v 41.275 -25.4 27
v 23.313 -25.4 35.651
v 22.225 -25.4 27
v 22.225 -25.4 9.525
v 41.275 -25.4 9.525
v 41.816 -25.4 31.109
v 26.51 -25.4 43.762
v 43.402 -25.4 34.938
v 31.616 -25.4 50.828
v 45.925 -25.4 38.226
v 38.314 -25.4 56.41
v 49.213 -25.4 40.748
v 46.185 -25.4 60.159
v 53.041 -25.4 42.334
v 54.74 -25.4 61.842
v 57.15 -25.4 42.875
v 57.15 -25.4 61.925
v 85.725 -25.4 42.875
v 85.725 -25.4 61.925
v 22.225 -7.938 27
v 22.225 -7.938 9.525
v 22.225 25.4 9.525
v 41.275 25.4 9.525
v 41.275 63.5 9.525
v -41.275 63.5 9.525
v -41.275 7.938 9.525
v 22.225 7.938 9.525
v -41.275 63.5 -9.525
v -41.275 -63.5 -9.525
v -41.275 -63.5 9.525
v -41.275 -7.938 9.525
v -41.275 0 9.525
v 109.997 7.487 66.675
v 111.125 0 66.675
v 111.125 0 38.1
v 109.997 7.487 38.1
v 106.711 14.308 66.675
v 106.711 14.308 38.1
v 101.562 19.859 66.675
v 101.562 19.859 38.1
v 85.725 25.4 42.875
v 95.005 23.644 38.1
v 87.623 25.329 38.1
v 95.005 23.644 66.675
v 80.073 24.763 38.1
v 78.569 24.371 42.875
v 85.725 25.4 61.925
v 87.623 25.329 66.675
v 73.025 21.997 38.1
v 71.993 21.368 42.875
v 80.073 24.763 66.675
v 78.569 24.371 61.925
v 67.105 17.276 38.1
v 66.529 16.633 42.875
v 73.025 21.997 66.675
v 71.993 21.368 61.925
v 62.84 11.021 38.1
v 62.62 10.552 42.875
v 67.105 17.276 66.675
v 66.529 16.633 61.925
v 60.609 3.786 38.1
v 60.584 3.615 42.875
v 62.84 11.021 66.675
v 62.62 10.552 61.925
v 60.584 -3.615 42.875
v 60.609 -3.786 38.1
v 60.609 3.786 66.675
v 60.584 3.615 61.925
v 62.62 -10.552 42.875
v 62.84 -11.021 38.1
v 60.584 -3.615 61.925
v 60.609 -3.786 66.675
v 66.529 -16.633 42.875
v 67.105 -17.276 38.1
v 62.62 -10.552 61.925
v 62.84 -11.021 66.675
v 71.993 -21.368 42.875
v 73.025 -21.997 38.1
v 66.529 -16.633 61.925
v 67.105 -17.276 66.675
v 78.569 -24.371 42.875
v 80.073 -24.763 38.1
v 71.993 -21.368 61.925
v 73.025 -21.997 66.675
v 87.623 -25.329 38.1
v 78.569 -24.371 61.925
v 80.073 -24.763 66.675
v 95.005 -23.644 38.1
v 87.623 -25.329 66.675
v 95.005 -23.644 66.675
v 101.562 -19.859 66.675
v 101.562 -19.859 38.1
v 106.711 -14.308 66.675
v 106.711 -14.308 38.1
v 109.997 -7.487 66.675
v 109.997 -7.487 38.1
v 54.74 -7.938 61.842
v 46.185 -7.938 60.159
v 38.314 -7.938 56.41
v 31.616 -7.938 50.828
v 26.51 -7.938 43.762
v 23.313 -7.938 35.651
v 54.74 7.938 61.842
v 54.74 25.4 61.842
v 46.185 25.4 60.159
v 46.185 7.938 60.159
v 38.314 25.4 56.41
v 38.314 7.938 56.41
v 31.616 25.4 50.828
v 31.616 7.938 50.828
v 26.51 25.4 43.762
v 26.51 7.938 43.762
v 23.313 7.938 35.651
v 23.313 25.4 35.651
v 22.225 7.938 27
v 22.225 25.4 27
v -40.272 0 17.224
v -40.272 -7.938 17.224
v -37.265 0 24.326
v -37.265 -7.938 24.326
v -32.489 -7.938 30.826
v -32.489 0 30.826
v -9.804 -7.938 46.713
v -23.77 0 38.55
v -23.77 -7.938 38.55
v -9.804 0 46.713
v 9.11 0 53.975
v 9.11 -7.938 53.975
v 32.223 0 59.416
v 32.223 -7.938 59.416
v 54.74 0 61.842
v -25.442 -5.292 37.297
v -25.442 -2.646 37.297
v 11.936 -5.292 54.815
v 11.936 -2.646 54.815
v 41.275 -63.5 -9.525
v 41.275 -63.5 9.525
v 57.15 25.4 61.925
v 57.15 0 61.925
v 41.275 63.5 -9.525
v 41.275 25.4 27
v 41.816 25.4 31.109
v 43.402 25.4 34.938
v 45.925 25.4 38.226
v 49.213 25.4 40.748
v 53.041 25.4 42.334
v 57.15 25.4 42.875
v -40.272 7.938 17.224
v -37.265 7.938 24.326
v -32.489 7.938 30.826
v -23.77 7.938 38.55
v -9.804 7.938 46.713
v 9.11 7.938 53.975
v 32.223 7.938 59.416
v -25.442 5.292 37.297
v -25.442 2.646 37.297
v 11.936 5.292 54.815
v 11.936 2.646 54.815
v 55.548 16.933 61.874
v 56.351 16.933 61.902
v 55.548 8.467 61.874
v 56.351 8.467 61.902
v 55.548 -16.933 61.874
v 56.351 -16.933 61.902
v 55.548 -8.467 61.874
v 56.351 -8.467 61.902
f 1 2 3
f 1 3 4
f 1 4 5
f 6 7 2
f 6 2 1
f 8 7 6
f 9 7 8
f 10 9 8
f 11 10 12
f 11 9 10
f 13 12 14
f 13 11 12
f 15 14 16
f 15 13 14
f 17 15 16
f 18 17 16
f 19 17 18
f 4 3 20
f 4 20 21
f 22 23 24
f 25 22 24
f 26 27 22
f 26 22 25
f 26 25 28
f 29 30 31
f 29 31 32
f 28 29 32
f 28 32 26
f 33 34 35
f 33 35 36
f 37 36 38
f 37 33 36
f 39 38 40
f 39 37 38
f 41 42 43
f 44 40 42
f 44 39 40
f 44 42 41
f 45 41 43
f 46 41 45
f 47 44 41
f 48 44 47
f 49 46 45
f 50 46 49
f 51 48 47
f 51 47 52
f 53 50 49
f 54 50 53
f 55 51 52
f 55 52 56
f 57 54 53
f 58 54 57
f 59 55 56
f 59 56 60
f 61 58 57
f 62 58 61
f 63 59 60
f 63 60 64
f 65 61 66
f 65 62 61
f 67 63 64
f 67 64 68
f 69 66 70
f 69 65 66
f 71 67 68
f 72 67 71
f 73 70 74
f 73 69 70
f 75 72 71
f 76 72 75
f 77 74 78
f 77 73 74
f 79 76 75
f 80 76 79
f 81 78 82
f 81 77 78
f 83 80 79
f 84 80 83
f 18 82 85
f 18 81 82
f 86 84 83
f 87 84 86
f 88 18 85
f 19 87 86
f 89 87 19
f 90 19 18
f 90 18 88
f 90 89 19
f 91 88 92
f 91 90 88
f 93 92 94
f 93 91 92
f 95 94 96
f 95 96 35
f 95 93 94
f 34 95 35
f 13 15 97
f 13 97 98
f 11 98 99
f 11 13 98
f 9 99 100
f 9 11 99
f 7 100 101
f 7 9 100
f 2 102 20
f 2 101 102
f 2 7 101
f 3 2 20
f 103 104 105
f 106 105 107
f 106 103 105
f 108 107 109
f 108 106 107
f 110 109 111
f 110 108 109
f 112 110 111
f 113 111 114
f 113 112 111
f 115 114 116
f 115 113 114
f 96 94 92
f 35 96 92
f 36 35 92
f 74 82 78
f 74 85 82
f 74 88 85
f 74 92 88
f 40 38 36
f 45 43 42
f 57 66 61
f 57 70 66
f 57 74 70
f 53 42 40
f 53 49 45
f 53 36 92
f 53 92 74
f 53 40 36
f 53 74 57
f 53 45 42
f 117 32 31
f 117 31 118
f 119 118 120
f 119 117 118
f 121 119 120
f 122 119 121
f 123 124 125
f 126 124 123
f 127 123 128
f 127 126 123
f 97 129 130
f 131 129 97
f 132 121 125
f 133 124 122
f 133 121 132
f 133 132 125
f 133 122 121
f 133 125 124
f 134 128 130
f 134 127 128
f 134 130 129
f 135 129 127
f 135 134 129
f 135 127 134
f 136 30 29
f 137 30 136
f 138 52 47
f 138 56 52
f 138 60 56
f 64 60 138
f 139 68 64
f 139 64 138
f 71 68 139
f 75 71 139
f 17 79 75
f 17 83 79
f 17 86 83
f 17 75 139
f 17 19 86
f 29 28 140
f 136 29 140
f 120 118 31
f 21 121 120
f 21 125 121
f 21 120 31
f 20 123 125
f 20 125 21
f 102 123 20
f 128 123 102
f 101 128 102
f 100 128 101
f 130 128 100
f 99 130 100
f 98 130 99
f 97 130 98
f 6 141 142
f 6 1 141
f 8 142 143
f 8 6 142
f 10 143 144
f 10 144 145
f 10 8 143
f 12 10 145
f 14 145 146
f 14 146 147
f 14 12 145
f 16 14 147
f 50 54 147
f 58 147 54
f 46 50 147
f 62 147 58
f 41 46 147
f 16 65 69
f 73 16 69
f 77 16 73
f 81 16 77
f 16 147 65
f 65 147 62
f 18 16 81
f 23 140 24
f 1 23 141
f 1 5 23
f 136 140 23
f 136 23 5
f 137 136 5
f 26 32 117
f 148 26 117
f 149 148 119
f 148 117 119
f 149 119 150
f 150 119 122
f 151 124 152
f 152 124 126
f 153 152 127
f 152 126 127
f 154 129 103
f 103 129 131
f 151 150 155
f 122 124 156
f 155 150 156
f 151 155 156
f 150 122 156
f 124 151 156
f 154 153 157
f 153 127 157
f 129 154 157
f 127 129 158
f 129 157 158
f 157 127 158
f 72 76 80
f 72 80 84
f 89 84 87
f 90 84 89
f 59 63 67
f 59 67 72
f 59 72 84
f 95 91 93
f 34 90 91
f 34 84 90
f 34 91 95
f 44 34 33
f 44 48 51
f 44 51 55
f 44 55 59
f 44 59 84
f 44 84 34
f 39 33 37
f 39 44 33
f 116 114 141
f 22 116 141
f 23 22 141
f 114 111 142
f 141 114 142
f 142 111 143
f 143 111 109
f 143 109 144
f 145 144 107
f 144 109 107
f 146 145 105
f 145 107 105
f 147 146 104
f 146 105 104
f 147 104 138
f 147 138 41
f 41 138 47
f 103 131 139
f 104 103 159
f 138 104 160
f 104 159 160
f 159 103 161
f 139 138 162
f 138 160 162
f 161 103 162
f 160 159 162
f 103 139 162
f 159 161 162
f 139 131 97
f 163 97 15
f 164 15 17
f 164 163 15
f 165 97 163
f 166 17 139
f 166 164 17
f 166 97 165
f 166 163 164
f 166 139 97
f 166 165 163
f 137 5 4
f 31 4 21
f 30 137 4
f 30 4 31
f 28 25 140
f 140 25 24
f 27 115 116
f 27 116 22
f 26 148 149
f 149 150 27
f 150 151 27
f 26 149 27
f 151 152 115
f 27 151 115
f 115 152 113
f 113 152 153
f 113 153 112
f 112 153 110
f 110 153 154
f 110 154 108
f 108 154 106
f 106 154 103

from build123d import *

# Parameters (mm, degrees)
F1_DEPTH = 63.5
F0_W     = 25.4
F0_H     = 19.05
F2_DEPTH = 25.4
F3_DEPTH = 7.9375


with BuildPart() as f1:
    # F0 (on Front) → F1 (new body, symmetric)
    with BuildSketch(Plane.XZ):
        Polygon((41.275, -9.525), (41.275, 9.525), (22.225, 9.525), (-41.275, 9.525), (-41.275, -9.525), align=None)
    extrude(amount=F1_DEPTH, both=True)

    # F0 (on Front) → F2 (join, symmetric)
    with BuildSketch(Plane.XZ):
        with Locations((73.025, 52.4002)):
            Rectangle(F0_W, F0_H)
        with BuildLine():
            Line((22.225, 9.525), (41.275, 9.525))
            Line((41.275, 9.525), (41.275, 27.0002))
            ThreePointArc((41.275, 27.0002), (45.9246798487, 38.2255201513), (57.15, 42.8752))
            Line((57.15, 42.8752), (60.325, 42.8752))
            Line((60.325, 42.8752), (60.325, 61.9252))
            Line((60.325, 61.9252), (57.15, 61.9252))
            add(Edge.make_bspline(
                [(54.7396282089, 61.841924022), (55.5498180251, 61.8762426879), (56.3534740618, 61.9040043012), (57.15, 61.9252)],
                knots=[109.298641458, 109.298641458, 109.298641458, 109.298641458, 111.5045361635, 111.5045361635, 111.5045361635, 111.5045361635], degree=3))
            ThreePointArc((54.7396282089, 61.841924022), (31.6163177371, 50.828475118), (22.225, 27.0002))
            Line((22.225, 27.0002), (22.225, 9.525))
        make_face()
    extrude(amount=F2_DEPTH, both=True)

    # F0 (on Front) → F3 (join, symmetric)
    with BuildSketch(Plane.XZ):
        with BuildLine():
            Line((-41.275, 9.525), (22.225, 9.525))
            Line((22.225, 9.525), (22.225, 27.0002))
            ThreePointArc((22.225, 27.0002), (31.6163177371, 50.828475118), (54.7396282089, 61.841924022))
            add(Edge.make_bspline(
                [(-41.275, 9.525), (-41.5883963276, 42.3431733754), (14.595986714, 60.1414876679), (54.7396282089, 61.841924022)],
                knots=[0, 0, 0, 0, 109.298641458, 109.298641458, 109.298641458, 109.298641458], degree=3))
        make_face()
    extrude(amount=F3_DEPTH, both=True)

    # F0 (on Front) → F4 (revolve)
    with BuildSketch(Plane.XZ):
        Polygon((85.725, 61.9252), (85.725, 42.8752), (85.725, 38.1), (111.125, 38.1), (111.125, 66.675), (85.725, 66.675), align=None)
    revolve(axis=Axis((85.725, 0, 52.3875), (0, 0, 1)))


solid = f1.part
